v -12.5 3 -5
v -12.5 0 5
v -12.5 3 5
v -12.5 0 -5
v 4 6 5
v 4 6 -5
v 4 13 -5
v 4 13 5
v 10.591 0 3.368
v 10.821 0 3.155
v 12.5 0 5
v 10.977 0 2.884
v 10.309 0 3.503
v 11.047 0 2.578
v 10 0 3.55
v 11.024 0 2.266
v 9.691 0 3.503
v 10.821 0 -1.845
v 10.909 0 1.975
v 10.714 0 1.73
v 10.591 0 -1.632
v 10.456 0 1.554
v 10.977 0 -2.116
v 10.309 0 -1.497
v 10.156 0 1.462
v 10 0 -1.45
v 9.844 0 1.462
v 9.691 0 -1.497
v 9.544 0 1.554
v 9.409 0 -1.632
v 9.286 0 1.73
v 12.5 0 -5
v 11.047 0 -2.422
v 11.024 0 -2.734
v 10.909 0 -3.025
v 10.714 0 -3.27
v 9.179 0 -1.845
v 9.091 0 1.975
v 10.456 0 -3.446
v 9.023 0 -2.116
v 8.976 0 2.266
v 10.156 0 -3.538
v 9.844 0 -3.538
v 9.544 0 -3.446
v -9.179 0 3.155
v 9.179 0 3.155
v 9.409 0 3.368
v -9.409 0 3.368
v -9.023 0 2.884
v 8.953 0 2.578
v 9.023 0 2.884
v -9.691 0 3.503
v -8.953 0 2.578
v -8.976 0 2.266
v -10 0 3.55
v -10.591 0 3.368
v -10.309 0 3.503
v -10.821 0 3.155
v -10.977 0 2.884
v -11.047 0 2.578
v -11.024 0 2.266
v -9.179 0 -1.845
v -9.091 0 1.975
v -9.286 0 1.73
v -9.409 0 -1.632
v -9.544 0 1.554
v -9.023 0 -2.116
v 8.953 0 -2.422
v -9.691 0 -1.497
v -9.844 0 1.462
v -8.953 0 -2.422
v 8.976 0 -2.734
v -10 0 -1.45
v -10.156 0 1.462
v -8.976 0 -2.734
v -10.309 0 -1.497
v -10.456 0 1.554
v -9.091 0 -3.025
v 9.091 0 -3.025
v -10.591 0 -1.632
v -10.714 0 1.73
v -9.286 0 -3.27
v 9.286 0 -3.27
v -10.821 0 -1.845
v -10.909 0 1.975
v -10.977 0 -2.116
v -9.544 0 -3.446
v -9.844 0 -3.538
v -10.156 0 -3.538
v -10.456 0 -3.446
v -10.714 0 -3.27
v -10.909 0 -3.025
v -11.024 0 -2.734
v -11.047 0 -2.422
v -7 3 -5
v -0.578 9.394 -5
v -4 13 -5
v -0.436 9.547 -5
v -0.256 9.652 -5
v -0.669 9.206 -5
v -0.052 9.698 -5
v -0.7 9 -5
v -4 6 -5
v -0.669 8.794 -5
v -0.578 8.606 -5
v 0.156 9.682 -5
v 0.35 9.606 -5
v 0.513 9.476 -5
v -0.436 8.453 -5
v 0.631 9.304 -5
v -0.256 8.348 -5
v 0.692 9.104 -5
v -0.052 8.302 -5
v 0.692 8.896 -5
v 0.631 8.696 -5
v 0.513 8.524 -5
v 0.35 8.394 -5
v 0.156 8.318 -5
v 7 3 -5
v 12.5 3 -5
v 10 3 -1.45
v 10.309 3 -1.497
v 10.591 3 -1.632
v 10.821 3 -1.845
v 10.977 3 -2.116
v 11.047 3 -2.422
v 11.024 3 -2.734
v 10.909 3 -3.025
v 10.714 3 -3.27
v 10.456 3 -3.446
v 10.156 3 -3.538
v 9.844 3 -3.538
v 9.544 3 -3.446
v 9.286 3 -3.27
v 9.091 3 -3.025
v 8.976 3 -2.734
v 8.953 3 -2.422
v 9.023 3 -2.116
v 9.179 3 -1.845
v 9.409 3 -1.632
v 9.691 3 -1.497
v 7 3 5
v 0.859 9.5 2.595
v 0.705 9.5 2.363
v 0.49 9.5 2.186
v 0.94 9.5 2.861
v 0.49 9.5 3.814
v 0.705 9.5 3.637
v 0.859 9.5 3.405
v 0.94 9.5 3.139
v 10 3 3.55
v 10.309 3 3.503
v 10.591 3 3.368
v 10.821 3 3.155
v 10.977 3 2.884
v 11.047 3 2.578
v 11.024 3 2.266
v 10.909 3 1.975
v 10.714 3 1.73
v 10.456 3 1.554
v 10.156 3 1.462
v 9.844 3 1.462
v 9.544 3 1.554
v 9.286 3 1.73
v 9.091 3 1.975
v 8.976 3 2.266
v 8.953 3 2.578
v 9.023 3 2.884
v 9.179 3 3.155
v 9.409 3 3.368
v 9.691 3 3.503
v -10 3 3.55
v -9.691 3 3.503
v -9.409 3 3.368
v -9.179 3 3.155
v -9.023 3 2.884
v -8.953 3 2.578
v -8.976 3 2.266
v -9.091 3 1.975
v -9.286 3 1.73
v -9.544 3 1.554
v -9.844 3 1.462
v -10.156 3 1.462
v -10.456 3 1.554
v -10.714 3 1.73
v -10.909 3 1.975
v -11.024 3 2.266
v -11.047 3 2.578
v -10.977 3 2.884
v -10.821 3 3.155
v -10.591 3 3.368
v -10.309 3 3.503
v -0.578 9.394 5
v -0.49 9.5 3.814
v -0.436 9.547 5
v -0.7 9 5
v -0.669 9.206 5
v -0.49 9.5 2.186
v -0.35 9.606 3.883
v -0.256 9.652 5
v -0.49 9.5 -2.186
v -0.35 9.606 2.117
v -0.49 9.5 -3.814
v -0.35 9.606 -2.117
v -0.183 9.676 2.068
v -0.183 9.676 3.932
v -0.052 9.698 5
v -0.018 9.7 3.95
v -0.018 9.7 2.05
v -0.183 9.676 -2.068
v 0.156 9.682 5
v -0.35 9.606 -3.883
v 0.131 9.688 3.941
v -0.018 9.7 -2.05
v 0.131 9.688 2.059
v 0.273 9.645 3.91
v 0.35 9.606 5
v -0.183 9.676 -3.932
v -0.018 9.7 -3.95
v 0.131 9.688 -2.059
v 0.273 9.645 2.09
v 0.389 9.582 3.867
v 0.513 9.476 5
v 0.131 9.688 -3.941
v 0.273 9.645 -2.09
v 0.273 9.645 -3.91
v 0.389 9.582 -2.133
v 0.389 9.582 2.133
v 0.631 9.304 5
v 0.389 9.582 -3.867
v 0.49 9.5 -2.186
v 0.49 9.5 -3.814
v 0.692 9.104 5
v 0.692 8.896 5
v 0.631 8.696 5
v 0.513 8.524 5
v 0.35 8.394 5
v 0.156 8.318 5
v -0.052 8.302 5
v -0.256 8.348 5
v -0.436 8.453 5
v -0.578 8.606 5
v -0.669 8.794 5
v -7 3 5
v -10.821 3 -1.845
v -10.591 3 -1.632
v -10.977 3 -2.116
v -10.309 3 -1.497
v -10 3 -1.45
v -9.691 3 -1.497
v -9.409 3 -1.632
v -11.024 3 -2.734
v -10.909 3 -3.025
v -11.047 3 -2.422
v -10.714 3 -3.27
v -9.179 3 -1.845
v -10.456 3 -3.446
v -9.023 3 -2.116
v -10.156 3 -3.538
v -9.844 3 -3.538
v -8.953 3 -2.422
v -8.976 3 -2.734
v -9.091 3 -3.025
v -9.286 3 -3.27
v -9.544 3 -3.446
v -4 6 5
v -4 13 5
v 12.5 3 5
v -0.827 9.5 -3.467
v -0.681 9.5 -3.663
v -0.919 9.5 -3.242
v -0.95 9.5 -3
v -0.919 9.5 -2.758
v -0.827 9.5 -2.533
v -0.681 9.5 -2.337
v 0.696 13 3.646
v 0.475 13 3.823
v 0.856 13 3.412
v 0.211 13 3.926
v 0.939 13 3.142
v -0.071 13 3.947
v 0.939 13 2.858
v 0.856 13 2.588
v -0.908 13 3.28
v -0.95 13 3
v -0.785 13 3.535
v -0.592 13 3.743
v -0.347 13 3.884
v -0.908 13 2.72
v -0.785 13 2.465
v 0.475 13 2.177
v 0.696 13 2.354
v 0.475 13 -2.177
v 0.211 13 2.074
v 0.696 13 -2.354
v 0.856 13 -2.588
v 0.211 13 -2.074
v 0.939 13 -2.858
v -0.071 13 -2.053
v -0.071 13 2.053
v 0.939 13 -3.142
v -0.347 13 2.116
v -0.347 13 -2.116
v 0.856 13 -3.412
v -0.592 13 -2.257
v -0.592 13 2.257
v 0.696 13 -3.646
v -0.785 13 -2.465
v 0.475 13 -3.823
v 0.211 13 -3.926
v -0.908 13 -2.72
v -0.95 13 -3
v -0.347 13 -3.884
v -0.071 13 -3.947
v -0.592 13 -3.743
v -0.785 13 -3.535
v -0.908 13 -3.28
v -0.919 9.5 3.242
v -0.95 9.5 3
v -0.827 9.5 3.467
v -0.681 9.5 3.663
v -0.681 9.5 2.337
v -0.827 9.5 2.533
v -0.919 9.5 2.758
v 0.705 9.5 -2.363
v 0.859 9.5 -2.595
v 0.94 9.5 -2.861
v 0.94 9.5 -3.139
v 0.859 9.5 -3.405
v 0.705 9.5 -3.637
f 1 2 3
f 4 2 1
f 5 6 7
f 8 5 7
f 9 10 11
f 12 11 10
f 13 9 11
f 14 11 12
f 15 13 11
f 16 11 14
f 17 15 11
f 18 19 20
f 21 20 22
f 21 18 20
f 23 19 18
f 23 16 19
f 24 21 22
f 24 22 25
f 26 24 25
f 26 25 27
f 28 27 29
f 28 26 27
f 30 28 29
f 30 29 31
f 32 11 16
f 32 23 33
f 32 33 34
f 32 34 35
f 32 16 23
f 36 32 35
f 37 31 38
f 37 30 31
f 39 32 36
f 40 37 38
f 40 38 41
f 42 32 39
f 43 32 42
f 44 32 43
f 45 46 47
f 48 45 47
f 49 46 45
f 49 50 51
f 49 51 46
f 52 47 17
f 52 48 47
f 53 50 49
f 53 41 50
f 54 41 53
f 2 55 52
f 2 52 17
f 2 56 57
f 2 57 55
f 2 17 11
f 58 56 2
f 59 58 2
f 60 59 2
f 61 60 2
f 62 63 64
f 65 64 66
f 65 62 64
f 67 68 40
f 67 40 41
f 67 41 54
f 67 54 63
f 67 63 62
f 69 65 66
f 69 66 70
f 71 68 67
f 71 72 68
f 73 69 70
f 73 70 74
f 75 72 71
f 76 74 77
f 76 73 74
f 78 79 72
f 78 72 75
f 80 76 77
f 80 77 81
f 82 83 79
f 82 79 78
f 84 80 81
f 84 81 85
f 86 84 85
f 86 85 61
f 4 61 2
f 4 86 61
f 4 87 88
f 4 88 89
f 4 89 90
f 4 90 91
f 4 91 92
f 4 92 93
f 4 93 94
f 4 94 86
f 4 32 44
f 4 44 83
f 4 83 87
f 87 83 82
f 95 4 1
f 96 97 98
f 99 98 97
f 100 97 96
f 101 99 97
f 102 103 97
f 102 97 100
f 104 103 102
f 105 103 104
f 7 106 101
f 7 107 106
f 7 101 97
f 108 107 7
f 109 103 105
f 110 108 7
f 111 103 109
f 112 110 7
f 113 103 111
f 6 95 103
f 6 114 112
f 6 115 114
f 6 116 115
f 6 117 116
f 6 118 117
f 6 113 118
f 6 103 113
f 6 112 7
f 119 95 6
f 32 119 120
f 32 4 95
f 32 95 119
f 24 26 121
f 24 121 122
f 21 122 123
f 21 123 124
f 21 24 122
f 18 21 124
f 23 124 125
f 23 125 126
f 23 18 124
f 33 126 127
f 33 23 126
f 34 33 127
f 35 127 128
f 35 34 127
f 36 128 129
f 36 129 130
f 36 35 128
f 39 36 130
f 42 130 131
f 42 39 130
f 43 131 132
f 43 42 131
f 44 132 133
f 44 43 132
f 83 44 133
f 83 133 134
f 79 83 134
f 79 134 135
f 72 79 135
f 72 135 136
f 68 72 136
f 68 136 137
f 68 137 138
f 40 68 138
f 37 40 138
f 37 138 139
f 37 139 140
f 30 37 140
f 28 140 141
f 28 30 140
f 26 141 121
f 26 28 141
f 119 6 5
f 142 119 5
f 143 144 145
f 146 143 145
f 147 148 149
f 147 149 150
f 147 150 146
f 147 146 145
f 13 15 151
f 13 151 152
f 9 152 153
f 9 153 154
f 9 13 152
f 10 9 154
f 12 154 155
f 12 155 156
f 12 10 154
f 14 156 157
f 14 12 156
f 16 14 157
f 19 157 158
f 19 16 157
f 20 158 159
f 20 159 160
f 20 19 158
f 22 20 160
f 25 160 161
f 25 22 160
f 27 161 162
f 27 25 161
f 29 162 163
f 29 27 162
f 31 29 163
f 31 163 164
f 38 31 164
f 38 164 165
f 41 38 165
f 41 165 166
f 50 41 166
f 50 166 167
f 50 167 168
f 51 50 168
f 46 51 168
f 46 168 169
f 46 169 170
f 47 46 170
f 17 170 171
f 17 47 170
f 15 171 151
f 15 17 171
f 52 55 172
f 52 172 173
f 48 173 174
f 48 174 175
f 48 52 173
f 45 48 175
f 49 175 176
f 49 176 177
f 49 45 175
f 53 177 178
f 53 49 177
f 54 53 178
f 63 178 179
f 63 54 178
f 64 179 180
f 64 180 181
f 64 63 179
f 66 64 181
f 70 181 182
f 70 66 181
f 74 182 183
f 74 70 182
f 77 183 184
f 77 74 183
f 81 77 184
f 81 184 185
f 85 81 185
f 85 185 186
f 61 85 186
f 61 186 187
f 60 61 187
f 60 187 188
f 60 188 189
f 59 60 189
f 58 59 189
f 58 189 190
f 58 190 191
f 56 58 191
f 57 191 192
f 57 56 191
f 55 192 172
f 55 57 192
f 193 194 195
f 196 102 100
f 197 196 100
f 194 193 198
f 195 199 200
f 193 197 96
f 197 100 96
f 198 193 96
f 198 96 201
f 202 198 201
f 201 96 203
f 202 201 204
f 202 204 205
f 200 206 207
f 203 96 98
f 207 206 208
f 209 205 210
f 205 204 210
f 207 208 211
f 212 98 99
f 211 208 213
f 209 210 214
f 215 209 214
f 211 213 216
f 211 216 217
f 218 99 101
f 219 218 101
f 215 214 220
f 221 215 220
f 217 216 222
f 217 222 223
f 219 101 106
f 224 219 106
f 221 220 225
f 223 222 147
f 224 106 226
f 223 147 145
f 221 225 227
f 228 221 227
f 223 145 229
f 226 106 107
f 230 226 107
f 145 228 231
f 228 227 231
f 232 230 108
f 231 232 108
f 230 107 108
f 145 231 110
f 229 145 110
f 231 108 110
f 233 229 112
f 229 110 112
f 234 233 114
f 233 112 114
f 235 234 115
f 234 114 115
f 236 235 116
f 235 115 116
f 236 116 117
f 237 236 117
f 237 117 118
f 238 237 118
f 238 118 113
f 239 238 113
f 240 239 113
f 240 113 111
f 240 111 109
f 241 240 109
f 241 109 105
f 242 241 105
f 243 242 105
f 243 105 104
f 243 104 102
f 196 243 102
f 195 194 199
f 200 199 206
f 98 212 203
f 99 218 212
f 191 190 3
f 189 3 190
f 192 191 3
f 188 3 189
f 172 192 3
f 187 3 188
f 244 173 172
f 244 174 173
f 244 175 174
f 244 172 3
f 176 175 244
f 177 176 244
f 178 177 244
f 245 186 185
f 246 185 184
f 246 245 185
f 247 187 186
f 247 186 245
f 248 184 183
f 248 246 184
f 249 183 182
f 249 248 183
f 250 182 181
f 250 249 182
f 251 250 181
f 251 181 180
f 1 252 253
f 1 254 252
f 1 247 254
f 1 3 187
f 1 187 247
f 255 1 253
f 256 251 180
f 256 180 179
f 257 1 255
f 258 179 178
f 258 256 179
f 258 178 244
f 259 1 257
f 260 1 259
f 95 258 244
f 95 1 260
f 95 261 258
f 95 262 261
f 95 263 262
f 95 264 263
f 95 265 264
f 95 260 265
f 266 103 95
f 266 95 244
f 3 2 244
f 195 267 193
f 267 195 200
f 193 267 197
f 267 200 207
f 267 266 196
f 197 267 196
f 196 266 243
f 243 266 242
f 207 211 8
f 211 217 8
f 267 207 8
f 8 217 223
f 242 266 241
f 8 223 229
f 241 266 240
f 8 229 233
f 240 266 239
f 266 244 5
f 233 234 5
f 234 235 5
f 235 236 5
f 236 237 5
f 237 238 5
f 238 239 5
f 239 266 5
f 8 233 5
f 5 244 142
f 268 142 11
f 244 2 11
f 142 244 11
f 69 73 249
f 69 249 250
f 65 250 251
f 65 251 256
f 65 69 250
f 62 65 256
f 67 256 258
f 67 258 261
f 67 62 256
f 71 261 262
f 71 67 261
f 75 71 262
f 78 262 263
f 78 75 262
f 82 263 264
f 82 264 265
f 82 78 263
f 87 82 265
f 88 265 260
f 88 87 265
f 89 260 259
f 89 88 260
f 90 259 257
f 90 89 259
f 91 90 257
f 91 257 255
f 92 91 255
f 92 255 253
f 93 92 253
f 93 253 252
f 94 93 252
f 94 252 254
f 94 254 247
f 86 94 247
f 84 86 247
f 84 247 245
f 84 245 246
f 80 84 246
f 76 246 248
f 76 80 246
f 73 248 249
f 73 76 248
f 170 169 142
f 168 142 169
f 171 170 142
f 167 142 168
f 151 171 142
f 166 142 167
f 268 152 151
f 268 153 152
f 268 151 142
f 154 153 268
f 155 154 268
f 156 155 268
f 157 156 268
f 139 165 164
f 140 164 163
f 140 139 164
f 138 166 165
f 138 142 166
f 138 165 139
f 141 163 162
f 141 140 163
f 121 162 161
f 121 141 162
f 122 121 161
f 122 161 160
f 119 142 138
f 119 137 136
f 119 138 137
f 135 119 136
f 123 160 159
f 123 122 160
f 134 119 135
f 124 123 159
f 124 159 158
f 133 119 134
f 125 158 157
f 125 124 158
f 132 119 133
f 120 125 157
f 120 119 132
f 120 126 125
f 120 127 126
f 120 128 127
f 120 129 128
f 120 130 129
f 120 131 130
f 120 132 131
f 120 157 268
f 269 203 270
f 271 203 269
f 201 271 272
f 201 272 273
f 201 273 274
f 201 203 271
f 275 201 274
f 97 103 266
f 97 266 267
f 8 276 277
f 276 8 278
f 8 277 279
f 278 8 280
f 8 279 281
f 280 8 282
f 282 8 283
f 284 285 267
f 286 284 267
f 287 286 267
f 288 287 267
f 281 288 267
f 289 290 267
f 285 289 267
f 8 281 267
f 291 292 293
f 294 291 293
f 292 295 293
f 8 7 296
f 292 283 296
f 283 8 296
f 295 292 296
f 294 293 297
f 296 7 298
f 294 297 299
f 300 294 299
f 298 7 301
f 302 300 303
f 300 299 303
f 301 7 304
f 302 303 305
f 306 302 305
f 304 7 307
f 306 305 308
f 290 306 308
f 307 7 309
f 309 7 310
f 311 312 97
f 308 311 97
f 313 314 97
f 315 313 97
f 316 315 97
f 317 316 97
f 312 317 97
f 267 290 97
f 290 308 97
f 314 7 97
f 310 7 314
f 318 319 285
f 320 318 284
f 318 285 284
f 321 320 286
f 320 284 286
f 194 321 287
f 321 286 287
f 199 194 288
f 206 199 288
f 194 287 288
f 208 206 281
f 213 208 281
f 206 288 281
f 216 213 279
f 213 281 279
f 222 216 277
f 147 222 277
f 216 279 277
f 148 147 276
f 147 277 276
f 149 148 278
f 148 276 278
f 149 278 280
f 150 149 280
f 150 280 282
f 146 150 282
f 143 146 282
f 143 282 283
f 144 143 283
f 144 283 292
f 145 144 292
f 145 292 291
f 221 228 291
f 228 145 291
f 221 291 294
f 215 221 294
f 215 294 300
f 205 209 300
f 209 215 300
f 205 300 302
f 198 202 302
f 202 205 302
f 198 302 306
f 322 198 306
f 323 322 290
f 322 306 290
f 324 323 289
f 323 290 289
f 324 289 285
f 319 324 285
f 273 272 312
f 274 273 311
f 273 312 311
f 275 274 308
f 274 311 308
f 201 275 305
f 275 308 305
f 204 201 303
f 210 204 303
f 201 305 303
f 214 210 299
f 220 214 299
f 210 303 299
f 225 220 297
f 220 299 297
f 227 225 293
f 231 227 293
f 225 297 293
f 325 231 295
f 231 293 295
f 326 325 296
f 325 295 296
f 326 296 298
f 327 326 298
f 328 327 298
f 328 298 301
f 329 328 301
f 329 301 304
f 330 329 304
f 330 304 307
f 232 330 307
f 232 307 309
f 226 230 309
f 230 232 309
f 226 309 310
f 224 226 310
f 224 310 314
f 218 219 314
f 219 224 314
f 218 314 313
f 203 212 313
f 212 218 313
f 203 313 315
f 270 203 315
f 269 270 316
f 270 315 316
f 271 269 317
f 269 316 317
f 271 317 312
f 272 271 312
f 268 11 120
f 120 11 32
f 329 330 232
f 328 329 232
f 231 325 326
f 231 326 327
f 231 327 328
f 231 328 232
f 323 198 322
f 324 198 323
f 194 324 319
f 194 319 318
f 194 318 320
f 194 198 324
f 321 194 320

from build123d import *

# Parameters (mm, degrees)
SKETCH1_W           = 25
SKETCH1_H           = 10
SKETCH1_R           = 1.05
BOSS_EXTRUDE1_DEPTH = 3
SKETCH3_W           = 8
SKETCH3_H           = 13
BOSS_EXTRUDE2_DEPTH = 10
SKETCH4_R           = 0.7
CUT_EXTRUDE1_DEPTH  = 21.621590627
SKETCH5_R           = 0.95
CUT_EXTRUDE2_DEPTH  = 3.5
CHAMFER1_SIZE       = 3


with BuildPart() as part:
    # Sketch1 → Boss-Extrude1 (new body)
    with BuildSketch(Plane(origin=(0, 0, 0), x_dir=(1, 0, 0), z_dir=(0, 1, 0))):
        Rectangle(SKETCH1_W, SKETCH1_H)
        with Locations(Location((-10, 2.5, 0), (0, 0, 270))):
            Circle(SKETCH1_R, mode=Mode.SUBTRACT)
        with Locations(Location((-10, -2.5, 0), (0, 0, 270))):
            Circle(SKETCH1_R, mode=Mode.SUBTRACT)
        with Locations(Location((10, 2.5, 0), (0, 0, 270))):
            Circle(SKETCH1_R, mode=Mode.SUBTRACT)
        with Locations(Location((10, -2.5, 0), (0, 0, 270))):
            Circle(SKETCH1_R, mode=Mode.SUBTRACT)
    extrude(amount=BOSS_EXTRUDE1_DEPTH)

    # Sketch3 → Boss-Extrude2 (add)
    with BuildSketch(Plane(origin=(0, 0, -5), x_dir=(-1, 0, 0), z_dir=(0, 0, -1))):
        with Locations((0, 6.5)):
            Rectangle(SKETCH3_W, SKETCH3_H)
    extrude(amount=-BOSS_EXTRUDE2_DEPTH)

    # Sketch4 → Cut-Extrude1 (cut, through all)
    with BuildSketch(Plane(origin=(0, 0, -5), x_dir=(-1, 0, 0), z_dir=(0, 0, -1))):
        with Locations((0, 9)):
            Circle(SKETCH4_R)
    extrude(amount=-CUT_EXTRUDE1_DEPTH, mode=Mode.SUBTRACT)

    # Sketch5 → Cut-Extrude2 (cut)
    with BuildSketch(Plane(origin=(0, 13, 0), x_dir=(1, 0, 0), z_dir=(0, 1, 0))):
        with Locations(Location((0, 3, 0), (0, 0, 180))):
            Circle(SKETCH5_R)
        with Locations(Location((0, -3, 0), (0, 0, 180))):
            Circle(SKETCH5_R)
    extrude(amount=-CUT_EXTRUDE2_DEPTH, mode=Mode.SUBTRACT)

    # Chamfer1
    chamfer1_edges = [part.edges().sort_by_distance(p)[0] for p in [
        (4, 3, 0),
        (-4, 3, 0),
    ]]
    chamfer(chamfer1_edges, length=CHAMFER1_SIZE)


solid = part.part
